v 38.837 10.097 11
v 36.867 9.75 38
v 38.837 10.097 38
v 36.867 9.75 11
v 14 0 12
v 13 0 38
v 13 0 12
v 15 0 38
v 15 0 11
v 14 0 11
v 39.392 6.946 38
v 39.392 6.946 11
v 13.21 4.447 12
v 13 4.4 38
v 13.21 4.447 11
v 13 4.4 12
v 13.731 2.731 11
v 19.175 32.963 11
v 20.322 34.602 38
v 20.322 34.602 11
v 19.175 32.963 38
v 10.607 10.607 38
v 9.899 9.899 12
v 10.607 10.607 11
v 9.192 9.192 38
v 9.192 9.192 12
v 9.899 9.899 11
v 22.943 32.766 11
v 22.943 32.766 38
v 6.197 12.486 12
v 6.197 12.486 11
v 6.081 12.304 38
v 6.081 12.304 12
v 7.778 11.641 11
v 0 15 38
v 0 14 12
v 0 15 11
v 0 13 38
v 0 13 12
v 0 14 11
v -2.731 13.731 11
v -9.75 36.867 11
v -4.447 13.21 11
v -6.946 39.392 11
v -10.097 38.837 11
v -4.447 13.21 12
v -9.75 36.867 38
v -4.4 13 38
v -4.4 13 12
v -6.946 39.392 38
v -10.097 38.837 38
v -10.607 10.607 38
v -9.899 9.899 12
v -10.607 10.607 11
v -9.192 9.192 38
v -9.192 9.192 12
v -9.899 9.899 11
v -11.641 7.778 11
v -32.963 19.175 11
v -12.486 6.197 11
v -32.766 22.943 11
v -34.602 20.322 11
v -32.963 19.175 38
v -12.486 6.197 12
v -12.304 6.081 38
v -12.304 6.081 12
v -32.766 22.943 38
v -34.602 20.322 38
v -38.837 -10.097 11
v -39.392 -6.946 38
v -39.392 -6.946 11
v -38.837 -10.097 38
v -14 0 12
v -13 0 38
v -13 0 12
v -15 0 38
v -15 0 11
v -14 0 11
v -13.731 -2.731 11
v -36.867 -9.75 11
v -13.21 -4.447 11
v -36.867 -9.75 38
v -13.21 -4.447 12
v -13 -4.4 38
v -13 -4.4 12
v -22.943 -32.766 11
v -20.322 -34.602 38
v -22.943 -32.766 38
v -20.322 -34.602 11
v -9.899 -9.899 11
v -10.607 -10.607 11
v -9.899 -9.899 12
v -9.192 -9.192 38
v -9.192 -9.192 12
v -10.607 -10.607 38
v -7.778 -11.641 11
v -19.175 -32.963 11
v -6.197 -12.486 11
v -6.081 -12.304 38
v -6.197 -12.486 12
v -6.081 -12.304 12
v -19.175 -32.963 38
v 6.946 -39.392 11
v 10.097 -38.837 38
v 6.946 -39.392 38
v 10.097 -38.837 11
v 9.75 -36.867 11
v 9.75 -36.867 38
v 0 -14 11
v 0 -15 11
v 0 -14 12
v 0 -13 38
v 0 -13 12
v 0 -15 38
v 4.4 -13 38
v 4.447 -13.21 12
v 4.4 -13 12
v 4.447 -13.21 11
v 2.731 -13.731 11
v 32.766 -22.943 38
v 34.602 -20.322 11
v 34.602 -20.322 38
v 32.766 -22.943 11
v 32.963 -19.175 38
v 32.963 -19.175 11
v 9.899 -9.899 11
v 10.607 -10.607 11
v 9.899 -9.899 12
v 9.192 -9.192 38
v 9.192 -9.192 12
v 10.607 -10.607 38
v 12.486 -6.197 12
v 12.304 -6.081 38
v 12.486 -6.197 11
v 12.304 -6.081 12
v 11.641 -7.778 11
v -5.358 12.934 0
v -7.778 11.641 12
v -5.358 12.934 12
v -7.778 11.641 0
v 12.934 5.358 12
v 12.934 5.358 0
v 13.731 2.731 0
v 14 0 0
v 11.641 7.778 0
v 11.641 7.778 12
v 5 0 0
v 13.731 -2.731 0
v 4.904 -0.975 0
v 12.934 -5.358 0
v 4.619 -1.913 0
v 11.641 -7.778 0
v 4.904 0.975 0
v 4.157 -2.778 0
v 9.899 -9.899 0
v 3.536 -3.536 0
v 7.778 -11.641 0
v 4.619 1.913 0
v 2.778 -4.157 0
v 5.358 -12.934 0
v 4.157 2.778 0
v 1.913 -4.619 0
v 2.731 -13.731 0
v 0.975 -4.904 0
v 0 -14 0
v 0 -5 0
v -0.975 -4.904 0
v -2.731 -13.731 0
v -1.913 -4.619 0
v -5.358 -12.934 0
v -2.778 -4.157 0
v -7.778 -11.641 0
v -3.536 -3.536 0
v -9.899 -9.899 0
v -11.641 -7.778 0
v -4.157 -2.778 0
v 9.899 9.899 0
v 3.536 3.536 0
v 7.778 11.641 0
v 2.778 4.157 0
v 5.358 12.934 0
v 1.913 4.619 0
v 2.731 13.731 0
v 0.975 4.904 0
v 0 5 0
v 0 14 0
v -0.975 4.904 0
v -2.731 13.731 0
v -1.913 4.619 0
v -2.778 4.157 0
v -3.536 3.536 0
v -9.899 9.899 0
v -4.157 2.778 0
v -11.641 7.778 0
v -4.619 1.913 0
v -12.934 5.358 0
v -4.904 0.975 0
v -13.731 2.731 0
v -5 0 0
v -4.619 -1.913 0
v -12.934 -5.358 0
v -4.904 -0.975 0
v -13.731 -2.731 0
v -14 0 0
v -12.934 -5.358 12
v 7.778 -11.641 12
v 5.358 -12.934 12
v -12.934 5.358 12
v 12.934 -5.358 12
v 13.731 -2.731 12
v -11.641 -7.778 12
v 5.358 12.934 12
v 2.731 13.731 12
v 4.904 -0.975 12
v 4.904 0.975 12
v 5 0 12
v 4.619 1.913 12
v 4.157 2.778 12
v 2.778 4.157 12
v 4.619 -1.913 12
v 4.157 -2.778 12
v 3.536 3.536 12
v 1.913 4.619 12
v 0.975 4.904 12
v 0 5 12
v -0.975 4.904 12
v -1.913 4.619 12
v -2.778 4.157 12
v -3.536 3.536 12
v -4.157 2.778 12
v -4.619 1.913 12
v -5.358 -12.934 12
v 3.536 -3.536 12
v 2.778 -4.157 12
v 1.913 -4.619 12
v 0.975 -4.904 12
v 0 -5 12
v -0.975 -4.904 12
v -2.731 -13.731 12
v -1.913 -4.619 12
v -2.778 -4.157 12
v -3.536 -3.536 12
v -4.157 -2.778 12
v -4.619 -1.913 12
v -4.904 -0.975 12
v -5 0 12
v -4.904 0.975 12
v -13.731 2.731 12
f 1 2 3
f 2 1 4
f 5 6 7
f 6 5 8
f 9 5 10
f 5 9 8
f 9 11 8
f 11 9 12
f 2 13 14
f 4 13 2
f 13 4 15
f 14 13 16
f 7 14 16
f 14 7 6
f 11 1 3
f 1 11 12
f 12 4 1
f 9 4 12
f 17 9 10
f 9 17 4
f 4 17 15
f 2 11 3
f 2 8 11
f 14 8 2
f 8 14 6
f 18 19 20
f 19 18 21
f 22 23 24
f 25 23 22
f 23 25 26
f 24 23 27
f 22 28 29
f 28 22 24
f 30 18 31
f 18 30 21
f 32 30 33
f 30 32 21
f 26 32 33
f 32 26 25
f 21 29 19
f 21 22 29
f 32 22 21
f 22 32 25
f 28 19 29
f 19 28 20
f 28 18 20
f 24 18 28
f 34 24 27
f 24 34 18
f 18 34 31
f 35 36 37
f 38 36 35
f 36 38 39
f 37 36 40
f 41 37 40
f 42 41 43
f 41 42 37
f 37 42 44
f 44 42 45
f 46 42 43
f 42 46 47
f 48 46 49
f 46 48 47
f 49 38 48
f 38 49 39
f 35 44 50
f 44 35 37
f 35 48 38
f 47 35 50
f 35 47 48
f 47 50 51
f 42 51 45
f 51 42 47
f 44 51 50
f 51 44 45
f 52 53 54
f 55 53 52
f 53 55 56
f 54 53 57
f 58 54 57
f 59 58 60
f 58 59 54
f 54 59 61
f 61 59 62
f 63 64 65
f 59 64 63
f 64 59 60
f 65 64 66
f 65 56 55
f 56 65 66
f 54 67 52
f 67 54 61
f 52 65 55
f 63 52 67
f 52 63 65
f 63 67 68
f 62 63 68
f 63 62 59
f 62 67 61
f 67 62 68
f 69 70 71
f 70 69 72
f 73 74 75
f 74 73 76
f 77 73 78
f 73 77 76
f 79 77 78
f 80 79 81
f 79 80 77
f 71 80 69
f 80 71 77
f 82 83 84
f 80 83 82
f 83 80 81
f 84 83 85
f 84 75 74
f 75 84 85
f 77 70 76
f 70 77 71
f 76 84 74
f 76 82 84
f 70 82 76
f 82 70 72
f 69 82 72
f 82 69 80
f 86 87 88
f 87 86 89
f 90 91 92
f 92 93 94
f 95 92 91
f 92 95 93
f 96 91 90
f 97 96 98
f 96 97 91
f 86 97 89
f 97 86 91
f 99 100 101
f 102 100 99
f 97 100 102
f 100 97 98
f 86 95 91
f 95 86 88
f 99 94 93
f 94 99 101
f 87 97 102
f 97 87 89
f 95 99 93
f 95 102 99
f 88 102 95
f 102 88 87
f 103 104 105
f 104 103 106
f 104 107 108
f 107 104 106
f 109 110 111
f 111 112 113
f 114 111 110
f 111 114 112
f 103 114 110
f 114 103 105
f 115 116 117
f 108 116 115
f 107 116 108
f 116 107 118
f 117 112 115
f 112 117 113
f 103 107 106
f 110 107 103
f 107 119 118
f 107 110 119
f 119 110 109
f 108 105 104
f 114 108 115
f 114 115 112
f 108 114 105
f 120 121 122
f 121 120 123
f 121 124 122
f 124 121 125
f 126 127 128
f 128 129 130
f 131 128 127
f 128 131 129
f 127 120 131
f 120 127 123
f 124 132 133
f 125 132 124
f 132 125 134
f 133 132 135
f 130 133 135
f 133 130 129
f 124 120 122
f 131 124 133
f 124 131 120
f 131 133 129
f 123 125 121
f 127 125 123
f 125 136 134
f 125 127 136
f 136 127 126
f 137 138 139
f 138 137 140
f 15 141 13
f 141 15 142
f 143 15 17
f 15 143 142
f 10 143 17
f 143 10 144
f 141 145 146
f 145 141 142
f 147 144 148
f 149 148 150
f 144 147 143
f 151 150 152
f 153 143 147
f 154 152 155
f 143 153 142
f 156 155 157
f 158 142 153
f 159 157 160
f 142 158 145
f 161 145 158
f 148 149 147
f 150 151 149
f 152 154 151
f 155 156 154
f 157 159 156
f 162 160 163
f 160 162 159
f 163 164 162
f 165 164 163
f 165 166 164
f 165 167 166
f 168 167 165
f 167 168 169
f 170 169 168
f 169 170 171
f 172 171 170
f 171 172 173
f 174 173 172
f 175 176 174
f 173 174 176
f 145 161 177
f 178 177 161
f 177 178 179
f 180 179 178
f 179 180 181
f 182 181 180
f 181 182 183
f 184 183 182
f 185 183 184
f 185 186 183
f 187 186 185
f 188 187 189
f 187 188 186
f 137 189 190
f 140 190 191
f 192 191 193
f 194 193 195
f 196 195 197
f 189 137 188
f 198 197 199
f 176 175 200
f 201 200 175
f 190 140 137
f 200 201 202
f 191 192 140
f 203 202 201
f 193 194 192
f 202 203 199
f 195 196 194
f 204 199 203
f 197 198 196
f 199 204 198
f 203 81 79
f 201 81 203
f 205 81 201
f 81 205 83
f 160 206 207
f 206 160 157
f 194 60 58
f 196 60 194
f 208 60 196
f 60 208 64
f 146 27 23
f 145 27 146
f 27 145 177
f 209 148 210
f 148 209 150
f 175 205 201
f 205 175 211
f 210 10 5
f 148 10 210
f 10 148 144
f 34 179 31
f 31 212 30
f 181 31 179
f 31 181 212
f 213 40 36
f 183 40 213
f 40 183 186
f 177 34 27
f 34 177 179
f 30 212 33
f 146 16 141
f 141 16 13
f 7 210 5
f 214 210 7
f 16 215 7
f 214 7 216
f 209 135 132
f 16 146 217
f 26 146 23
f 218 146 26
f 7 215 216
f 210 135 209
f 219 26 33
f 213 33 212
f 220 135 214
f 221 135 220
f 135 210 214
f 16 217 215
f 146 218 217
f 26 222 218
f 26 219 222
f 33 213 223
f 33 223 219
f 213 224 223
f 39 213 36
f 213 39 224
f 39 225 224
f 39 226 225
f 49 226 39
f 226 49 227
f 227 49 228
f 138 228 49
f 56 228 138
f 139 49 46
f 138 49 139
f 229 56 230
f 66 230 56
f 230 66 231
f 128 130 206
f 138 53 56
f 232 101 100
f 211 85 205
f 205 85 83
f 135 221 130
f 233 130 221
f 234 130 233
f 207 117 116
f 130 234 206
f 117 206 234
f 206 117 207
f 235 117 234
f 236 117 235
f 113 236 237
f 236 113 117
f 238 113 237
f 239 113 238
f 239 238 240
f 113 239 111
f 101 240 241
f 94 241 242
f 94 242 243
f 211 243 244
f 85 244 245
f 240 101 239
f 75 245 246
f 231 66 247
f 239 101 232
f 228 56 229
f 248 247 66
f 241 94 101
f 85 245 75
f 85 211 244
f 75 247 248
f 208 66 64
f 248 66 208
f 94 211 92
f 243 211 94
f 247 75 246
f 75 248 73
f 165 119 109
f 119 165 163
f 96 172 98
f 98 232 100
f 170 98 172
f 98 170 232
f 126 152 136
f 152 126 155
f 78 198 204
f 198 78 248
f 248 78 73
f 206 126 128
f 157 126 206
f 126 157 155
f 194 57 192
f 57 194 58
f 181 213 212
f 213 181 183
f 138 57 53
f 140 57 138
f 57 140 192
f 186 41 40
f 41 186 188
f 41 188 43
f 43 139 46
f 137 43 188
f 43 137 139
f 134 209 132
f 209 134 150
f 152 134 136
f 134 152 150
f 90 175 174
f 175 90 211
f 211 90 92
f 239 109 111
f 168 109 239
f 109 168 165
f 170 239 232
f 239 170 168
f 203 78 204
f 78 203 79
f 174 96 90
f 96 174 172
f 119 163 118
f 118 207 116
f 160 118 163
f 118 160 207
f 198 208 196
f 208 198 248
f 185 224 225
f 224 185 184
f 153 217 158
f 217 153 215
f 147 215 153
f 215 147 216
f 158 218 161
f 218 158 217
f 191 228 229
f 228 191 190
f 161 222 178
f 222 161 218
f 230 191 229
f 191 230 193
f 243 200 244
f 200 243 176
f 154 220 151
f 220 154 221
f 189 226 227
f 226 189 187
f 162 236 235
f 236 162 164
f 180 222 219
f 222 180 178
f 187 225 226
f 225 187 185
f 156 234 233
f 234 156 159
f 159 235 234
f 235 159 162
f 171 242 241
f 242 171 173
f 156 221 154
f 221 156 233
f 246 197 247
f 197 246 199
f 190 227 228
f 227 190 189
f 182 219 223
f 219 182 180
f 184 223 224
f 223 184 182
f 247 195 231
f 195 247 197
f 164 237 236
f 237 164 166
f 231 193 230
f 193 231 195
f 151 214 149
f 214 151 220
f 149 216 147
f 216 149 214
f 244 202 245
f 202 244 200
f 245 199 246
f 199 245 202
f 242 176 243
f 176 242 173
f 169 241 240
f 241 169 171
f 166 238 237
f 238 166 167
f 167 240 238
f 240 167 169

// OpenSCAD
$fn = 32;

// ----------------------------------------------------------------------
// Impeller: 80 mm, 8 blades, 38 mm tall
// ----------------------------------------------------------------------

// --- parameters (mm) ---
hub_d = 28;               // hub diameter
hub_h = 12;               // hub height
imp_d = 80;               // outer diameter over the blades
blades = 8;               // number of blades
blade_t = 2;              // blade thickness
blade_h = 26;             // blade height
blade_in_r = 13;          // blade root radius
blade_out_r = 38;         // blade tip radius
sweep = 10;               // blade sweep, degrees
bore_d = 10;              // shaft bore

module hub() {
  cylinder(h = hub_h, d = hub_d);
}

module blade() {
  /* blade swept between two boxes: hull of the root and the tip section */
  hull() {
    translate([blade_in_r, 0, hub_h - 1])
      cube([blade_t, blade_t * 2.2, blade_h + 1], center = false);
    rotate([0, 0, sweep])
      translate([blade_out_r, 0, hub_h - 1])
        cube([blade_t, blade_t * 1.6, blade_h + 1], center = false);
  }
}

module blades() {
  for (i = [0 : blades - 1])
    rotate([0, 0, i * 360 / blades]) blade();
}

difference() {
  union() {
    hub();
    blades();
  }
  translate([0, 0, -1]) cylinder(h = hub_h + blade_h + 0 + 3, d = bore_d);
}
